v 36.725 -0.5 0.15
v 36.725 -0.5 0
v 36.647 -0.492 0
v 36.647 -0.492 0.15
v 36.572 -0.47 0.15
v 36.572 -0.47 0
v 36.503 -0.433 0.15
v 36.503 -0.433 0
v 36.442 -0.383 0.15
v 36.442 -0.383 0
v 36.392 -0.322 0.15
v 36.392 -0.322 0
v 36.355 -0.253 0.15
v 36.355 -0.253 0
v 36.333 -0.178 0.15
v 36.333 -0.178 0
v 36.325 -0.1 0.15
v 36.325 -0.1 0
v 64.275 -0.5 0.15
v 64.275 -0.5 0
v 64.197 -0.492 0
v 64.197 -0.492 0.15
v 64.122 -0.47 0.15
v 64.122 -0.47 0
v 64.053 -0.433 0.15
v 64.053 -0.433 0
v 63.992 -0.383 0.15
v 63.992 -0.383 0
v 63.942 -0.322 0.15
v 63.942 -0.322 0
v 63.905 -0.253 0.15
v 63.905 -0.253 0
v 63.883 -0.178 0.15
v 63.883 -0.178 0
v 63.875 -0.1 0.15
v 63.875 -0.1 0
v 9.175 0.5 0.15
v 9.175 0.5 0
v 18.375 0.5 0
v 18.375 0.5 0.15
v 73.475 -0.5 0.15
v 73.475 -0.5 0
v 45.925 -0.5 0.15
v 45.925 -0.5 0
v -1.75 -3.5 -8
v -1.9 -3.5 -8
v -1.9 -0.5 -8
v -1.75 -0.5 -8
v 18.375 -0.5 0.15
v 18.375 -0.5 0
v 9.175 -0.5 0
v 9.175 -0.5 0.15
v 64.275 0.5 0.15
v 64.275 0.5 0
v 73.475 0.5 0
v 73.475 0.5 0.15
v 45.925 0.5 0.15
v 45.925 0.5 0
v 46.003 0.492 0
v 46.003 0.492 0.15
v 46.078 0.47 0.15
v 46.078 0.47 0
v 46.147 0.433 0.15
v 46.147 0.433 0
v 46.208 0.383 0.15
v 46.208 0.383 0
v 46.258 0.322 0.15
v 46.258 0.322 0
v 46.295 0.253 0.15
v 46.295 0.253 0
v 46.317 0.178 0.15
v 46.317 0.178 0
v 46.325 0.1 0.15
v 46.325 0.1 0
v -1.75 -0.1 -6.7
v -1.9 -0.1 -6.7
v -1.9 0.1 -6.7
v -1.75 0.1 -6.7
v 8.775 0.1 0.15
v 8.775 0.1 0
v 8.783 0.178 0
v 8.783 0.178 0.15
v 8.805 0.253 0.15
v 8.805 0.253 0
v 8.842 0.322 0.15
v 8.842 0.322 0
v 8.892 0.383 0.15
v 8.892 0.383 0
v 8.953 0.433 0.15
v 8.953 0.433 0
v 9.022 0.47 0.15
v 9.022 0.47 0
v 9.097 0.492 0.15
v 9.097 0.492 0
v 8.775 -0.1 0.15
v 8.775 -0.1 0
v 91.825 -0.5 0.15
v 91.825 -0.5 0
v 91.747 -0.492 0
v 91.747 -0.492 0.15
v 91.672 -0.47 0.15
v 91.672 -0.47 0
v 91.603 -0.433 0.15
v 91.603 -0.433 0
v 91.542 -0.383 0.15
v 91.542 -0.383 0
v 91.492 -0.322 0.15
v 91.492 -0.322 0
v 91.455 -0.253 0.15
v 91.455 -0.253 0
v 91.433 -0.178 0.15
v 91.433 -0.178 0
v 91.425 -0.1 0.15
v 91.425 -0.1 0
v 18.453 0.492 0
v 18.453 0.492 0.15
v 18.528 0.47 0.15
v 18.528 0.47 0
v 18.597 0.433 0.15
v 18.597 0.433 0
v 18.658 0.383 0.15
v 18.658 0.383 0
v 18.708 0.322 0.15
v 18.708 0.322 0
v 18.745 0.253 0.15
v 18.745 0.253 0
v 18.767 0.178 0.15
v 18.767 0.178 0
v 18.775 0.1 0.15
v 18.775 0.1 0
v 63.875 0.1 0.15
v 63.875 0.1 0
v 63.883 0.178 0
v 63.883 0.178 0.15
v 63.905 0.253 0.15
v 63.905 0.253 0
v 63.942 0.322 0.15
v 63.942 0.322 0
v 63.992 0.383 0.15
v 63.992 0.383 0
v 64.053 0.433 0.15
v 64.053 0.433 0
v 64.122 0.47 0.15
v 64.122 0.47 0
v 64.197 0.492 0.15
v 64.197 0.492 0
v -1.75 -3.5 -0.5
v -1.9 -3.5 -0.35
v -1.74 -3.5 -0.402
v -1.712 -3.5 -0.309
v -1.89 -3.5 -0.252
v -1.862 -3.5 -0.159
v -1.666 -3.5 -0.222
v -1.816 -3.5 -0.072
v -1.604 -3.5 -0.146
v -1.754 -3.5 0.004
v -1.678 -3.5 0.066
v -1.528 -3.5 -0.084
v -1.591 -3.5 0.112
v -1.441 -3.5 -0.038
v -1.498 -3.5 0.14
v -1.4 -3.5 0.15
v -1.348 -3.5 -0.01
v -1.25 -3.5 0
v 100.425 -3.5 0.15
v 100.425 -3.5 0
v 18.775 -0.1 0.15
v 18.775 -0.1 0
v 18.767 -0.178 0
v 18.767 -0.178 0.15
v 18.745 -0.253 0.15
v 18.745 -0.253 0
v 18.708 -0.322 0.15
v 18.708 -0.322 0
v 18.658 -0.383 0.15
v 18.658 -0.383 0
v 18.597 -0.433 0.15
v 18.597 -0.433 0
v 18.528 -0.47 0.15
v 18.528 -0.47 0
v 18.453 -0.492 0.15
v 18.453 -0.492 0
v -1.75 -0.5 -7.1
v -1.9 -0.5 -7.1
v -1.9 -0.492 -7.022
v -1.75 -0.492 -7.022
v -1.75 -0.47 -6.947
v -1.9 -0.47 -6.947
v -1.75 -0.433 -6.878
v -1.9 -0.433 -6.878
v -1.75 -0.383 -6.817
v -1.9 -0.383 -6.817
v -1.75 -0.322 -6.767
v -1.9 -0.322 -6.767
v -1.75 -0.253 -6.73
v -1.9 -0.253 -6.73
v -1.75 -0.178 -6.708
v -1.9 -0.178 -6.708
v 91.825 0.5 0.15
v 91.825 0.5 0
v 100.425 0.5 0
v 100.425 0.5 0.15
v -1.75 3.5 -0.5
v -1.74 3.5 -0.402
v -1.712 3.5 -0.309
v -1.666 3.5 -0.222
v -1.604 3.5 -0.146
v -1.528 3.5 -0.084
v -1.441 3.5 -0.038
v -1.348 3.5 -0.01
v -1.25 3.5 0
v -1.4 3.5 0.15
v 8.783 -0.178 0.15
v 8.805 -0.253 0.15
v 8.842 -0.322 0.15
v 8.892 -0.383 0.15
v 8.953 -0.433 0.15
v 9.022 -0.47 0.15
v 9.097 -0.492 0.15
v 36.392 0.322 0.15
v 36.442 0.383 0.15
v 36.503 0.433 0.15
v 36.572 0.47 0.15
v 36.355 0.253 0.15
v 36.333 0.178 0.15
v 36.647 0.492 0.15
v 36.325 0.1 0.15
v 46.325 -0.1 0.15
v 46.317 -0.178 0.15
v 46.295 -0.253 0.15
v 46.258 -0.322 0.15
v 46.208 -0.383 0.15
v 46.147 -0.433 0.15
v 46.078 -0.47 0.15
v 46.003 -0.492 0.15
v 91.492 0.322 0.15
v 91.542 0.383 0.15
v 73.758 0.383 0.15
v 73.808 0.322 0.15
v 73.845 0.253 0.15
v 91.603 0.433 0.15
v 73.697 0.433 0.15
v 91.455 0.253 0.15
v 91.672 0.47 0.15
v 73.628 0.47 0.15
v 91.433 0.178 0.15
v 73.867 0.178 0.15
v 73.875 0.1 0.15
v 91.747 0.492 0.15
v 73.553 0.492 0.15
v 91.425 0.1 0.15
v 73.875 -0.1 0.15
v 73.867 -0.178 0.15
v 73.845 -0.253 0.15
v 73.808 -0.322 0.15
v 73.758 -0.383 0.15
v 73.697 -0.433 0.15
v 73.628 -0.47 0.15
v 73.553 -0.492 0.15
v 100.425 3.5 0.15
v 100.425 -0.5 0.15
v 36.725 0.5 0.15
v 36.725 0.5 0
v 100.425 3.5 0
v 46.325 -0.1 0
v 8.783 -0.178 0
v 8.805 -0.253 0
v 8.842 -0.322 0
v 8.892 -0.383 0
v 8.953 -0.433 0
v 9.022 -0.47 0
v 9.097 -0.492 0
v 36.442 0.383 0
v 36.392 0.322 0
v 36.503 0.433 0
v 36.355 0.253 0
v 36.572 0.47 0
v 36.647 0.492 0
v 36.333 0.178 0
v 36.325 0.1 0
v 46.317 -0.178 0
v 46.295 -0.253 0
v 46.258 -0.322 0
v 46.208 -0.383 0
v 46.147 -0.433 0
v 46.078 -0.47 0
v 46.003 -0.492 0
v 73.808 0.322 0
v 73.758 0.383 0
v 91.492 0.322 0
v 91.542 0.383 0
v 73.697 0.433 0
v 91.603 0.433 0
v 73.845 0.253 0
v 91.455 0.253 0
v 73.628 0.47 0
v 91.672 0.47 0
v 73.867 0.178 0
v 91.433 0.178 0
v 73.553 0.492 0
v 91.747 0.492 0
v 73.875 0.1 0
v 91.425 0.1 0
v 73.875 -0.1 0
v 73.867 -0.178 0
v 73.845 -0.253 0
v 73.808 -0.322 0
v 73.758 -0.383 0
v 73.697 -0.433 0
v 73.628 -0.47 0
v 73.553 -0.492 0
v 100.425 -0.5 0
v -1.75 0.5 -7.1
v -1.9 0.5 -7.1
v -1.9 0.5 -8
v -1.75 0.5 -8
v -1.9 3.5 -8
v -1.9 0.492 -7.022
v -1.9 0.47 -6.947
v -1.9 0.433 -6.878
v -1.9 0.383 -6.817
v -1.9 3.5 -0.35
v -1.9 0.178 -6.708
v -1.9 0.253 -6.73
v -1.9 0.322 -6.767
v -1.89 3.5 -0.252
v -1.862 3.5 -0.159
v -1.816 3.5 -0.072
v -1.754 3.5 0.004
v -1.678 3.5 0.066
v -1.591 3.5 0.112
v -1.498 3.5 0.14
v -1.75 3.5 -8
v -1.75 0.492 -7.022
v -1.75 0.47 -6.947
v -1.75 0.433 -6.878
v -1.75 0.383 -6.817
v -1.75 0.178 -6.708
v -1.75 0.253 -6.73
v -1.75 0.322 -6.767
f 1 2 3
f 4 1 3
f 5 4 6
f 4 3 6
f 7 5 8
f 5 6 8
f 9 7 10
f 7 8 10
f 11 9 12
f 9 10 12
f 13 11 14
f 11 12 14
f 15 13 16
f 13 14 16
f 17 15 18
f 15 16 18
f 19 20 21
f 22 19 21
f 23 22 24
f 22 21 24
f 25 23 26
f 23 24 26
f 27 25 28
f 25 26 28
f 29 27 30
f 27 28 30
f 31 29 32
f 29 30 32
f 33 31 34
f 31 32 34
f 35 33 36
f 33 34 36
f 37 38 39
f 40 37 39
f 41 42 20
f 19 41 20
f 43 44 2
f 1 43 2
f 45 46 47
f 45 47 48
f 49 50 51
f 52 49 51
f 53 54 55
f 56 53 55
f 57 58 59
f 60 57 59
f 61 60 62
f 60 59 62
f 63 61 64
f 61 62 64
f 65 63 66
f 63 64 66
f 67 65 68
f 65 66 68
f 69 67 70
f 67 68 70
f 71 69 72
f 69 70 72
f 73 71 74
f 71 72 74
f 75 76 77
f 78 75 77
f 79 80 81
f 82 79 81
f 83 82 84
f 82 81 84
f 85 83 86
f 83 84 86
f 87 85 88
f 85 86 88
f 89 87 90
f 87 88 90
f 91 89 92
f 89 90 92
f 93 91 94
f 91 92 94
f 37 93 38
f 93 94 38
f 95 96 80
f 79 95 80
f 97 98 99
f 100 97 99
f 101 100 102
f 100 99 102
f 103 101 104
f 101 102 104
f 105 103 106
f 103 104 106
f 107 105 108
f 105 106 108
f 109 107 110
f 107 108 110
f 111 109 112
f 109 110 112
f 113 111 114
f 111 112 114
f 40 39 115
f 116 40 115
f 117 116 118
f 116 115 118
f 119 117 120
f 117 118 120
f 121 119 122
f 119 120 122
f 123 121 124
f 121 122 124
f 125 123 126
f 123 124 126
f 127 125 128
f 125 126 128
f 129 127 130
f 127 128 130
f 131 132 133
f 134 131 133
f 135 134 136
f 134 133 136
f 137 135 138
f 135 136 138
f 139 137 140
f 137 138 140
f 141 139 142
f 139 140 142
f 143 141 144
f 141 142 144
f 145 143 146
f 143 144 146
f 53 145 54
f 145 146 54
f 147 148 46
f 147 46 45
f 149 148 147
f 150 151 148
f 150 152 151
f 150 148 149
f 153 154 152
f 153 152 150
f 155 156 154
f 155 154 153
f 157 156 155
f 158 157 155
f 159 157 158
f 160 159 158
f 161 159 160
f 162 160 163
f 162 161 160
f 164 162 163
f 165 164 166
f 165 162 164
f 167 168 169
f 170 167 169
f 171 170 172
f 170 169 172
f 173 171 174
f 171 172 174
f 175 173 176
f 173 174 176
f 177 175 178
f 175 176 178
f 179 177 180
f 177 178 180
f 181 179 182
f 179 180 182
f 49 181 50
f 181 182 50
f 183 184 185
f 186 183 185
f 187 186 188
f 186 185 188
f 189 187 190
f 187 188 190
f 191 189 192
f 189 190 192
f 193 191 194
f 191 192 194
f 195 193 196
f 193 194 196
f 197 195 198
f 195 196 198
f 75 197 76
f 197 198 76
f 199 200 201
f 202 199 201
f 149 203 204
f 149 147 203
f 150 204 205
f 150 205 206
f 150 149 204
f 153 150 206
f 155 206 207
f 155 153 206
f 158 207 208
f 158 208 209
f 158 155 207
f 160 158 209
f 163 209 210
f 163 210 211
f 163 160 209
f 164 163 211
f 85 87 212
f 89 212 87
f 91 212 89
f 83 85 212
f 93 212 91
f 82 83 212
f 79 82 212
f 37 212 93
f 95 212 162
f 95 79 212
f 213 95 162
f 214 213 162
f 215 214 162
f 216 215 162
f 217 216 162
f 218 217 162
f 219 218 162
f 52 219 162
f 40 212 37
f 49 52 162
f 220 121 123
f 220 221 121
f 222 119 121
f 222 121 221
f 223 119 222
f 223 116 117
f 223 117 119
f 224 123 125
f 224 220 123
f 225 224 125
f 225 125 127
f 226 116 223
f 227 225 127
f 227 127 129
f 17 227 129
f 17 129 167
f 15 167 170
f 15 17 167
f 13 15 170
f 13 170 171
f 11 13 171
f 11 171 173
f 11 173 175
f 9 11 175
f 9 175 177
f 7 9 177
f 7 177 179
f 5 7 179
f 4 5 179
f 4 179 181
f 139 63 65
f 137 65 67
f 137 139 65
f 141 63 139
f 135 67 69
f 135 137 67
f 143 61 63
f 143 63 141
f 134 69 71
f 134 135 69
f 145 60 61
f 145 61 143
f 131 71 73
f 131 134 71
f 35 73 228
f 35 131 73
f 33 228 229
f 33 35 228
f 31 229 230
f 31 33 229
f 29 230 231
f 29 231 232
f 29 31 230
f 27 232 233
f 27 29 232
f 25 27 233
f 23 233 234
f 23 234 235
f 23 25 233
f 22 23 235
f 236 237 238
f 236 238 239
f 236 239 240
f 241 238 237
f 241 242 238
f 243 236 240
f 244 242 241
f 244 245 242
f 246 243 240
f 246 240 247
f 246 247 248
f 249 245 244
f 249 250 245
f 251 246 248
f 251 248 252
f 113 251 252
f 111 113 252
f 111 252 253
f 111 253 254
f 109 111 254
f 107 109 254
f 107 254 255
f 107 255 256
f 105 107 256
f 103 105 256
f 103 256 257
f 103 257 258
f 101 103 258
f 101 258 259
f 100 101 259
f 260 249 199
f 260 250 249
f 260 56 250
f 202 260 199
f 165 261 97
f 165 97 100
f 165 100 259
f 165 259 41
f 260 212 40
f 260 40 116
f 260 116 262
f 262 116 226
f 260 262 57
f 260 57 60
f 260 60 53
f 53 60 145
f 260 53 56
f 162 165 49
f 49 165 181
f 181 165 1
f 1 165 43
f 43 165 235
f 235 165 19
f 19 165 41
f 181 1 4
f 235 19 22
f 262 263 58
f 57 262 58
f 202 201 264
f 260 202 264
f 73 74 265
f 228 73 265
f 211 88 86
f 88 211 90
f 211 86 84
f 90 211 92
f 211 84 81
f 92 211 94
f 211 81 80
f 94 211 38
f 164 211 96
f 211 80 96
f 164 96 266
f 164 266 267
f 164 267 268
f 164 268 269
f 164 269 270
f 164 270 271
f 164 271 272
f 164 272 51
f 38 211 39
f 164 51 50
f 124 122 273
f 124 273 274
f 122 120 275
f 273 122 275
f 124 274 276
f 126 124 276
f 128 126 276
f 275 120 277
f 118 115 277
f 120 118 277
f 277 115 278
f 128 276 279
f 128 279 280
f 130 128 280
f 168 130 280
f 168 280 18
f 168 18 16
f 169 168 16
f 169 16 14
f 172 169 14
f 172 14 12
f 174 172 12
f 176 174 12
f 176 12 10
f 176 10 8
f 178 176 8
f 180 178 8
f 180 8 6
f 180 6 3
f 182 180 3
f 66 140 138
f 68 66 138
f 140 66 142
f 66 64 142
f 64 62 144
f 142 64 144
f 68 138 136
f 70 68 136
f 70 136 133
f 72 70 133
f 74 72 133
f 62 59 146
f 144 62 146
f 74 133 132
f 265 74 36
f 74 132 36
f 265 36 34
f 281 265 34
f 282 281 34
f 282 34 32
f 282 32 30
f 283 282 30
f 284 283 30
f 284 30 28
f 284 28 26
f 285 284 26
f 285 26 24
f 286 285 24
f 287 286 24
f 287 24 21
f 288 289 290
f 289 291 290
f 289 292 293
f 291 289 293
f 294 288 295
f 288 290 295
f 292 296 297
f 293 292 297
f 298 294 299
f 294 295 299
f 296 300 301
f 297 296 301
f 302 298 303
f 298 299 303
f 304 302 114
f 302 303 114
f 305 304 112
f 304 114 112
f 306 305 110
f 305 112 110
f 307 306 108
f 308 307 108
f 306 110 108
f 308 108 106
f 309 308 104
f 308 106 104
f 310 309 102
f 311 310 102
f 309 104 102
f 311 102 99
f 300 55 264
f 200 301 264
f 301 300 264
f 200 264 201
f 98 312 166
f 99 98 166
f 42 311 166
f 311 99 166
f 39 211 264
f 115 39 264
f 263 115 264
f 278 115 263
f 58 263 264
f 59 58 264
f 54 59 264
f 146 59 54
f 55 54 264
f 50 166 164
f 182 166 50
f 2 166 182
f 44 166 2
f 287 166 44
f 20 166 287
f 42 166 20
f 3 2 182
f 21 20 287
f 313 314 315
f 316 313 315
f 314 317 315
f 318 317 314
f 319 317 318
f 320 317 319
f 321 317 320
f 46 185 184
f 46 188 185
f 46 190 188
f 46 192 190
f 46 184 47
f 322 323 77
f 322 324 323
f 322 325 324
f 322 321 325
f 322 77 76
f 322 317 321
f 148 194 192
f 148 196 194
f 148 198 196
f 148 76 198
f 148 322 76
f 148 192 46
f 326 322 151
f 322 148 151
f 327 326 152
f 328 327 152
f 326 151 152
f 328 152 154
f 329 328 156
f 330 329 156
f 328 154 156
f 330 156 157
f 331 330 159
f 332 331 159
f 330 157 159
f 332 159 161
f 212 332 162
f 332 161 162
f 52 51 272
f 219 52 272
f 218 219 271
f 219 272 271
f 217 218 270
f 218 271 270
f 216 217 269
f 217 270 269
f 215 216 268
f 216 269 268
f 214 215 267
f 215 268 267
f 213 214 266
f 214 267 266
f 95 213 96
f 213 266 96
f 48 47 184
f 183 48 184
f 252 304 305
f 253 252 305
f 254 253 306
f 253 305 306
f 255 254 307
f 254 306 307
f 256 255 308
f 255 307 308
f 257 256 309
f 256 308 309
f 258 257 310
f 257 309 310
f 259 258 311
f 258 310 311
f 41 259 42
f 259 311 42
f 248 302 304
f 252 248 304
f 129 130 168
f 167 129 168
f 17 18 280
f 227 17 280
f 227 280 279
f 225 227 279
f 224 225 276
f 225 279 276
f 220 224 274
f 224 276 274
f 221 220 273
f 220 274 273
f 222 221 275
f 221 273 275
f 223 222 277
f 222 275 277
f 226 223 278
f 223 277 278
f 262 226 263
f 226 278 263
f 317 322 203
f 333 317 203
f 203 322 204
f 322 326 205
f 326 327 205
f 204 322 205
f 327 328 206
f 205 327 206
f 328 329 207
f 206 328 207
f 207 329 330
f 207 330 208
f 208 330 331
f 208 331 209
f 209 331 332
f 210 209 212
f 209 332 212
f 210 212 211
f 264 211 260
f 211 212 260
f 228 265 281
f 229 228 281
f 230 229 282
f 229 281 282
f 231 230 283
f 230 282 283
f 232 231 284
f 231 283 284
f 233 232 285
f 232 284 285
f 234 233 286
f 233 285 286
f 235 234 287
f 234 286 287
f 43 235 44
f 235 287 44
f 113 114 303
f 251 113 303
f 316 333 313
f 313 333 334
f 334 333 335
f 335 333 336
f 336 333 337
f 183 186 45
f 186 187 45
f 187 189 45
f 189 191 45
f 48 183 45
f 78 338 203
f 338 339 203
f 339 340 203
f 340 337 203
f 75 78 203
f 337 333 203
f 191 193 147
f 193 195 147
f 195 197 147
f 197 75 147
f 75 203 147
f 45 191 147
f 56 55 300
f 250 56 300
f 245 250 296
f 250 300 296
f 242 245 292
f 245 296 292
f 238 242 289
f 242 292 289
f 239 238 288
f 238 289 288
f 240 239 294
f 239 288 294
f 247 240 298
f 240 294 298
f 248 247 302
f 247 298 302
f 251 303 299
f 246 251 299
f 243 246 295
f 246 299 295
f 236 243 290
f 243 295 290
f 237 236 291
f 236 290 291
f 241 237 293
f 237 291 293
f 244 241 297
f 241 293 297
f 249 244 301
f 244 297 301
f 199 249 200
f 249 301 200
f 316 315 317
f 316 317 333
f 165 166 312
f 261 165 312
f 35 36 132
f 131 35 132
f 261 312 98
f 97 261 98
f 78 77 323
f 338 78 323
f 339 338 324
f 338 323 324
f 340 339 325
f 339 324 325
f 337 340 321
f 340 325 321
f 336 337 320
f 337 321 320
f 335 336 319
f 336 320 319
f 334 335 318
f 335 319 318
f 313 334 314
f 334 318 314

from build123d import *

# Parameters (mm, degrees)
F0_W     = 4
F0_H     = 3
F1_DEPTH = 0.15
F2_DEPTH = 1.9
F3_W     = 0.15
F3_H     = 7
F4_DEPTH = 8
F6_DEPTH = 25
F7_R     = 0.5


with BuildPart() as f1:
    # F0 (on Top) → F1 (new body)
    with BuildSketch(Plane.XY):
        with BuildLine():
            Line((0, 3.5), (0, -3.5))
            Line((0, -3.5), (13.775, -3.5))
            Line((13.775, -3.5), (13.775, -0.5))
            Line((13.775, -0.5), (9.175, -0.5))
            ThreePointArc((9.175, -0.5), (8.8921572875, -0.3828427125), (8.775, -0.1))
            Line((8.775, -0.1), (8.775, 0.1))
            ThreePointArc((8.775, 0.1), (8.8921572875, 0.3828427125), (9.175, 0.5))
            Line((9.175, 0.5), (13.775, 0.5))
            Line((13.775, 0.5), (13.775, 3.5))
            Line((13.775, 3.5), (0, 3.5))
        make_face()
        with BuildLine():
            Line((13.775, -0.5), (13.775, -3.5))
            Line((13.775, -3.5), (27.55, -3.5))
            Line((27.55, -3.5), (41.325, -3.5))
            Line((41.325, -3.5), (41.325, -0.5))
            Line((41.325, -0.5), (36.725, -0.5))
            ThreePointArc((36.725, -0.5), (36.4421572875, -0.3828427125), (36.325, -0.1))
            Line((36.325, -0.1), (36.325, 0.1))
            ThreePointArc((36.325, 0.1), (36.4421572875, 0.3828427125), (36.725, 0.5))
            Line((36.725, 0.5), (41.325, 0.5))
            Line((41.325, 0.5), (41.325, 3.5))
            Line((41.325, 3.5), (27.55, 3.5))
            Line((27.55, 3.5), (13.775, 3.5))
            Line((13.775, 3.5), (13.775, 0.5))
            Line((13.775, 0.5), (18.375, 0.5))
            ThreePointArc((18.375, 0.5), (18.6578427125, 0.3828427125), (18.775, 0.1))
            Line((18.775, 0.1), (18.775, -0.1))
            ThreePointArc((18.775, -0.1), (18.6578427125, -0.3828427125), (18.375, -0.5))
            Line((18.375, -0.5), (13.775, -0.5))
        make_face()
        with BuildLine():
            Line((41.325, -0.5), (41.325, -3.5))
            Line((41.325, -3.5), (55.1, -3.5))
            Line((55.1, -3.5), (68.875, -3.5))
            Line((68.875, -3.5), (68.875, -0.5))
            Line((68.875, -0.5), (64.275, -0.5))
            ThreePointArc((64.275, -0.5), (63.9921572875, -0.3828427125), (63.875, -0.1))
            Line((63.875, -0.1), (63.875, 0.1))
            ThreePointArc((63.875, 0.1), (63.9921572875, 0.3828427125), (64.275, 0.5))
            Line((64.275, 0.5), (68.875, 0.5))
            Line((68.875, 0.5), (68.875, 3.5))
            Line((68.875, 3.5), (55.1, 3.5))
            Line((55.1, 3.5), (41.325, 3.5))
            Line((41.325, 3.5), (41.325, 0.5))
            Line((41.325, 0.5), (45.925, 0.5))
            ThreePointArc((45.925, 0.5), (46.2078427125, 0.3828427125), (46.325, 0.1))
            Line((46.325, 0.1), (46.325, -0.1))
            ThreePointArc((46.325, -0.1), (46.2078427125, -0.3828427125), (45.925, -0.5))
            Line((45.925, -0.5), (41.325, -0.5))
        make_face()
        with BuildLine():
            Line((68.875, -0.5), (68.875, -3.5))
            Line((68.875, -3.5), (82.65, -3.5))
            Line((82.65, -3.5), (96.425, -3.5))
            Line((96.425, -3.5), (96.425, -0.5))
            Line((96.425, -0.5), (91.825, -0.5))
            ThreePointArc((91.825, -0.5), (91.5421572875, -0.3828427125), (91.425, -0.1))
            Line((91.425, -0.1), (91.425, 0.1))
            ThreePointArc((91.425, 0.1), (91.5421572875, 0.3828427125), (91.825, 0.5))
            Line((91.825, 0.5), (96.425, 0.5))
            Line((96.425, 0.5), (96.425, 3.5))
            Line((96.425, 3.5), (82.65, 3.5))
            Line((82.65, 3.5), (68.875, 3.5))
            Line((68.875, 3.5), (68.875, 0.5))
            Line((68.875, 0.5), (73.475, 0.5))
            ThreePointArc((73.475, 0.5), (73.7578427125, 0.3828427125), (73.875, 0.1))
            Line((73.875, 0.1), (73.875, -0.1))
            ThreePointArc((73.875, -0.1), (73.7578427125, -0.3828427125), (73.475, -0.5))
            Line((73.475, -0.5), (68.875, -0.5))
        make_face()
        with Locations((98.425, -2)):
            Rectangle(F0_W, F0_H)
        with Locations((98.425, 2)):
            Rectangle(F0_W, F0_H)
    extrude(amount=F1_DEPTH)

    # F2 (add): a face of the model
    f2_faces = [f1.faces().sort_by_distance(p)[0] for p in [
        (0, 0, 0.075),
    ]]
    extrude(f2_faces, amount=F2_DEPTH)

    # F3 (on face) → F4 (join)
    with BuildSketch(Plane(origin=(0, 0, 0), x_dir=(1, 0, 0), z_dir=(0, 0, -1))):
        with Locations((-1.825, 0)):
            Rectangle(F3_W, F3_H)
    extrude(amount=F4_DEPTH)

    # F5 (on face) → F6 (cut)
    with BuildSketch(Plane(origin=(-1.9, 0, 0), x_dir=(0, -1, 0), z_dir=(-1, 0, 0))):
        with BuildLine():
            ThreePointArc((0.5, -7.1), (0.3828427125, -6.8171572875), (0.1, -6.7))
            Line((0.1, -6.7), (-0.1, -6.7))
            ThreePointArc((-0.1, -6.7), (-0.3828427125, -6.8171572875), (-0.5, -7.1))
            Line((-0.5, -7.1), (-0.5, -8))
            Line((-0.5, -8), (0.5, -8))
            Line((0.5, -8), (0.5, -7.1))
        make_face()
    extrude(amount=-F6_DEPTH, mode=Mode.SUBTRACT)

    # F7
    f7_edges = [f1.edges().sort_by_distance(p)[0] for p in [
        (-1.9, 0, 0.15),
        (-1.75, 0, 0),
    ]]
    fillet(f7_edges, radius=F7_R)


solid = f1.part
